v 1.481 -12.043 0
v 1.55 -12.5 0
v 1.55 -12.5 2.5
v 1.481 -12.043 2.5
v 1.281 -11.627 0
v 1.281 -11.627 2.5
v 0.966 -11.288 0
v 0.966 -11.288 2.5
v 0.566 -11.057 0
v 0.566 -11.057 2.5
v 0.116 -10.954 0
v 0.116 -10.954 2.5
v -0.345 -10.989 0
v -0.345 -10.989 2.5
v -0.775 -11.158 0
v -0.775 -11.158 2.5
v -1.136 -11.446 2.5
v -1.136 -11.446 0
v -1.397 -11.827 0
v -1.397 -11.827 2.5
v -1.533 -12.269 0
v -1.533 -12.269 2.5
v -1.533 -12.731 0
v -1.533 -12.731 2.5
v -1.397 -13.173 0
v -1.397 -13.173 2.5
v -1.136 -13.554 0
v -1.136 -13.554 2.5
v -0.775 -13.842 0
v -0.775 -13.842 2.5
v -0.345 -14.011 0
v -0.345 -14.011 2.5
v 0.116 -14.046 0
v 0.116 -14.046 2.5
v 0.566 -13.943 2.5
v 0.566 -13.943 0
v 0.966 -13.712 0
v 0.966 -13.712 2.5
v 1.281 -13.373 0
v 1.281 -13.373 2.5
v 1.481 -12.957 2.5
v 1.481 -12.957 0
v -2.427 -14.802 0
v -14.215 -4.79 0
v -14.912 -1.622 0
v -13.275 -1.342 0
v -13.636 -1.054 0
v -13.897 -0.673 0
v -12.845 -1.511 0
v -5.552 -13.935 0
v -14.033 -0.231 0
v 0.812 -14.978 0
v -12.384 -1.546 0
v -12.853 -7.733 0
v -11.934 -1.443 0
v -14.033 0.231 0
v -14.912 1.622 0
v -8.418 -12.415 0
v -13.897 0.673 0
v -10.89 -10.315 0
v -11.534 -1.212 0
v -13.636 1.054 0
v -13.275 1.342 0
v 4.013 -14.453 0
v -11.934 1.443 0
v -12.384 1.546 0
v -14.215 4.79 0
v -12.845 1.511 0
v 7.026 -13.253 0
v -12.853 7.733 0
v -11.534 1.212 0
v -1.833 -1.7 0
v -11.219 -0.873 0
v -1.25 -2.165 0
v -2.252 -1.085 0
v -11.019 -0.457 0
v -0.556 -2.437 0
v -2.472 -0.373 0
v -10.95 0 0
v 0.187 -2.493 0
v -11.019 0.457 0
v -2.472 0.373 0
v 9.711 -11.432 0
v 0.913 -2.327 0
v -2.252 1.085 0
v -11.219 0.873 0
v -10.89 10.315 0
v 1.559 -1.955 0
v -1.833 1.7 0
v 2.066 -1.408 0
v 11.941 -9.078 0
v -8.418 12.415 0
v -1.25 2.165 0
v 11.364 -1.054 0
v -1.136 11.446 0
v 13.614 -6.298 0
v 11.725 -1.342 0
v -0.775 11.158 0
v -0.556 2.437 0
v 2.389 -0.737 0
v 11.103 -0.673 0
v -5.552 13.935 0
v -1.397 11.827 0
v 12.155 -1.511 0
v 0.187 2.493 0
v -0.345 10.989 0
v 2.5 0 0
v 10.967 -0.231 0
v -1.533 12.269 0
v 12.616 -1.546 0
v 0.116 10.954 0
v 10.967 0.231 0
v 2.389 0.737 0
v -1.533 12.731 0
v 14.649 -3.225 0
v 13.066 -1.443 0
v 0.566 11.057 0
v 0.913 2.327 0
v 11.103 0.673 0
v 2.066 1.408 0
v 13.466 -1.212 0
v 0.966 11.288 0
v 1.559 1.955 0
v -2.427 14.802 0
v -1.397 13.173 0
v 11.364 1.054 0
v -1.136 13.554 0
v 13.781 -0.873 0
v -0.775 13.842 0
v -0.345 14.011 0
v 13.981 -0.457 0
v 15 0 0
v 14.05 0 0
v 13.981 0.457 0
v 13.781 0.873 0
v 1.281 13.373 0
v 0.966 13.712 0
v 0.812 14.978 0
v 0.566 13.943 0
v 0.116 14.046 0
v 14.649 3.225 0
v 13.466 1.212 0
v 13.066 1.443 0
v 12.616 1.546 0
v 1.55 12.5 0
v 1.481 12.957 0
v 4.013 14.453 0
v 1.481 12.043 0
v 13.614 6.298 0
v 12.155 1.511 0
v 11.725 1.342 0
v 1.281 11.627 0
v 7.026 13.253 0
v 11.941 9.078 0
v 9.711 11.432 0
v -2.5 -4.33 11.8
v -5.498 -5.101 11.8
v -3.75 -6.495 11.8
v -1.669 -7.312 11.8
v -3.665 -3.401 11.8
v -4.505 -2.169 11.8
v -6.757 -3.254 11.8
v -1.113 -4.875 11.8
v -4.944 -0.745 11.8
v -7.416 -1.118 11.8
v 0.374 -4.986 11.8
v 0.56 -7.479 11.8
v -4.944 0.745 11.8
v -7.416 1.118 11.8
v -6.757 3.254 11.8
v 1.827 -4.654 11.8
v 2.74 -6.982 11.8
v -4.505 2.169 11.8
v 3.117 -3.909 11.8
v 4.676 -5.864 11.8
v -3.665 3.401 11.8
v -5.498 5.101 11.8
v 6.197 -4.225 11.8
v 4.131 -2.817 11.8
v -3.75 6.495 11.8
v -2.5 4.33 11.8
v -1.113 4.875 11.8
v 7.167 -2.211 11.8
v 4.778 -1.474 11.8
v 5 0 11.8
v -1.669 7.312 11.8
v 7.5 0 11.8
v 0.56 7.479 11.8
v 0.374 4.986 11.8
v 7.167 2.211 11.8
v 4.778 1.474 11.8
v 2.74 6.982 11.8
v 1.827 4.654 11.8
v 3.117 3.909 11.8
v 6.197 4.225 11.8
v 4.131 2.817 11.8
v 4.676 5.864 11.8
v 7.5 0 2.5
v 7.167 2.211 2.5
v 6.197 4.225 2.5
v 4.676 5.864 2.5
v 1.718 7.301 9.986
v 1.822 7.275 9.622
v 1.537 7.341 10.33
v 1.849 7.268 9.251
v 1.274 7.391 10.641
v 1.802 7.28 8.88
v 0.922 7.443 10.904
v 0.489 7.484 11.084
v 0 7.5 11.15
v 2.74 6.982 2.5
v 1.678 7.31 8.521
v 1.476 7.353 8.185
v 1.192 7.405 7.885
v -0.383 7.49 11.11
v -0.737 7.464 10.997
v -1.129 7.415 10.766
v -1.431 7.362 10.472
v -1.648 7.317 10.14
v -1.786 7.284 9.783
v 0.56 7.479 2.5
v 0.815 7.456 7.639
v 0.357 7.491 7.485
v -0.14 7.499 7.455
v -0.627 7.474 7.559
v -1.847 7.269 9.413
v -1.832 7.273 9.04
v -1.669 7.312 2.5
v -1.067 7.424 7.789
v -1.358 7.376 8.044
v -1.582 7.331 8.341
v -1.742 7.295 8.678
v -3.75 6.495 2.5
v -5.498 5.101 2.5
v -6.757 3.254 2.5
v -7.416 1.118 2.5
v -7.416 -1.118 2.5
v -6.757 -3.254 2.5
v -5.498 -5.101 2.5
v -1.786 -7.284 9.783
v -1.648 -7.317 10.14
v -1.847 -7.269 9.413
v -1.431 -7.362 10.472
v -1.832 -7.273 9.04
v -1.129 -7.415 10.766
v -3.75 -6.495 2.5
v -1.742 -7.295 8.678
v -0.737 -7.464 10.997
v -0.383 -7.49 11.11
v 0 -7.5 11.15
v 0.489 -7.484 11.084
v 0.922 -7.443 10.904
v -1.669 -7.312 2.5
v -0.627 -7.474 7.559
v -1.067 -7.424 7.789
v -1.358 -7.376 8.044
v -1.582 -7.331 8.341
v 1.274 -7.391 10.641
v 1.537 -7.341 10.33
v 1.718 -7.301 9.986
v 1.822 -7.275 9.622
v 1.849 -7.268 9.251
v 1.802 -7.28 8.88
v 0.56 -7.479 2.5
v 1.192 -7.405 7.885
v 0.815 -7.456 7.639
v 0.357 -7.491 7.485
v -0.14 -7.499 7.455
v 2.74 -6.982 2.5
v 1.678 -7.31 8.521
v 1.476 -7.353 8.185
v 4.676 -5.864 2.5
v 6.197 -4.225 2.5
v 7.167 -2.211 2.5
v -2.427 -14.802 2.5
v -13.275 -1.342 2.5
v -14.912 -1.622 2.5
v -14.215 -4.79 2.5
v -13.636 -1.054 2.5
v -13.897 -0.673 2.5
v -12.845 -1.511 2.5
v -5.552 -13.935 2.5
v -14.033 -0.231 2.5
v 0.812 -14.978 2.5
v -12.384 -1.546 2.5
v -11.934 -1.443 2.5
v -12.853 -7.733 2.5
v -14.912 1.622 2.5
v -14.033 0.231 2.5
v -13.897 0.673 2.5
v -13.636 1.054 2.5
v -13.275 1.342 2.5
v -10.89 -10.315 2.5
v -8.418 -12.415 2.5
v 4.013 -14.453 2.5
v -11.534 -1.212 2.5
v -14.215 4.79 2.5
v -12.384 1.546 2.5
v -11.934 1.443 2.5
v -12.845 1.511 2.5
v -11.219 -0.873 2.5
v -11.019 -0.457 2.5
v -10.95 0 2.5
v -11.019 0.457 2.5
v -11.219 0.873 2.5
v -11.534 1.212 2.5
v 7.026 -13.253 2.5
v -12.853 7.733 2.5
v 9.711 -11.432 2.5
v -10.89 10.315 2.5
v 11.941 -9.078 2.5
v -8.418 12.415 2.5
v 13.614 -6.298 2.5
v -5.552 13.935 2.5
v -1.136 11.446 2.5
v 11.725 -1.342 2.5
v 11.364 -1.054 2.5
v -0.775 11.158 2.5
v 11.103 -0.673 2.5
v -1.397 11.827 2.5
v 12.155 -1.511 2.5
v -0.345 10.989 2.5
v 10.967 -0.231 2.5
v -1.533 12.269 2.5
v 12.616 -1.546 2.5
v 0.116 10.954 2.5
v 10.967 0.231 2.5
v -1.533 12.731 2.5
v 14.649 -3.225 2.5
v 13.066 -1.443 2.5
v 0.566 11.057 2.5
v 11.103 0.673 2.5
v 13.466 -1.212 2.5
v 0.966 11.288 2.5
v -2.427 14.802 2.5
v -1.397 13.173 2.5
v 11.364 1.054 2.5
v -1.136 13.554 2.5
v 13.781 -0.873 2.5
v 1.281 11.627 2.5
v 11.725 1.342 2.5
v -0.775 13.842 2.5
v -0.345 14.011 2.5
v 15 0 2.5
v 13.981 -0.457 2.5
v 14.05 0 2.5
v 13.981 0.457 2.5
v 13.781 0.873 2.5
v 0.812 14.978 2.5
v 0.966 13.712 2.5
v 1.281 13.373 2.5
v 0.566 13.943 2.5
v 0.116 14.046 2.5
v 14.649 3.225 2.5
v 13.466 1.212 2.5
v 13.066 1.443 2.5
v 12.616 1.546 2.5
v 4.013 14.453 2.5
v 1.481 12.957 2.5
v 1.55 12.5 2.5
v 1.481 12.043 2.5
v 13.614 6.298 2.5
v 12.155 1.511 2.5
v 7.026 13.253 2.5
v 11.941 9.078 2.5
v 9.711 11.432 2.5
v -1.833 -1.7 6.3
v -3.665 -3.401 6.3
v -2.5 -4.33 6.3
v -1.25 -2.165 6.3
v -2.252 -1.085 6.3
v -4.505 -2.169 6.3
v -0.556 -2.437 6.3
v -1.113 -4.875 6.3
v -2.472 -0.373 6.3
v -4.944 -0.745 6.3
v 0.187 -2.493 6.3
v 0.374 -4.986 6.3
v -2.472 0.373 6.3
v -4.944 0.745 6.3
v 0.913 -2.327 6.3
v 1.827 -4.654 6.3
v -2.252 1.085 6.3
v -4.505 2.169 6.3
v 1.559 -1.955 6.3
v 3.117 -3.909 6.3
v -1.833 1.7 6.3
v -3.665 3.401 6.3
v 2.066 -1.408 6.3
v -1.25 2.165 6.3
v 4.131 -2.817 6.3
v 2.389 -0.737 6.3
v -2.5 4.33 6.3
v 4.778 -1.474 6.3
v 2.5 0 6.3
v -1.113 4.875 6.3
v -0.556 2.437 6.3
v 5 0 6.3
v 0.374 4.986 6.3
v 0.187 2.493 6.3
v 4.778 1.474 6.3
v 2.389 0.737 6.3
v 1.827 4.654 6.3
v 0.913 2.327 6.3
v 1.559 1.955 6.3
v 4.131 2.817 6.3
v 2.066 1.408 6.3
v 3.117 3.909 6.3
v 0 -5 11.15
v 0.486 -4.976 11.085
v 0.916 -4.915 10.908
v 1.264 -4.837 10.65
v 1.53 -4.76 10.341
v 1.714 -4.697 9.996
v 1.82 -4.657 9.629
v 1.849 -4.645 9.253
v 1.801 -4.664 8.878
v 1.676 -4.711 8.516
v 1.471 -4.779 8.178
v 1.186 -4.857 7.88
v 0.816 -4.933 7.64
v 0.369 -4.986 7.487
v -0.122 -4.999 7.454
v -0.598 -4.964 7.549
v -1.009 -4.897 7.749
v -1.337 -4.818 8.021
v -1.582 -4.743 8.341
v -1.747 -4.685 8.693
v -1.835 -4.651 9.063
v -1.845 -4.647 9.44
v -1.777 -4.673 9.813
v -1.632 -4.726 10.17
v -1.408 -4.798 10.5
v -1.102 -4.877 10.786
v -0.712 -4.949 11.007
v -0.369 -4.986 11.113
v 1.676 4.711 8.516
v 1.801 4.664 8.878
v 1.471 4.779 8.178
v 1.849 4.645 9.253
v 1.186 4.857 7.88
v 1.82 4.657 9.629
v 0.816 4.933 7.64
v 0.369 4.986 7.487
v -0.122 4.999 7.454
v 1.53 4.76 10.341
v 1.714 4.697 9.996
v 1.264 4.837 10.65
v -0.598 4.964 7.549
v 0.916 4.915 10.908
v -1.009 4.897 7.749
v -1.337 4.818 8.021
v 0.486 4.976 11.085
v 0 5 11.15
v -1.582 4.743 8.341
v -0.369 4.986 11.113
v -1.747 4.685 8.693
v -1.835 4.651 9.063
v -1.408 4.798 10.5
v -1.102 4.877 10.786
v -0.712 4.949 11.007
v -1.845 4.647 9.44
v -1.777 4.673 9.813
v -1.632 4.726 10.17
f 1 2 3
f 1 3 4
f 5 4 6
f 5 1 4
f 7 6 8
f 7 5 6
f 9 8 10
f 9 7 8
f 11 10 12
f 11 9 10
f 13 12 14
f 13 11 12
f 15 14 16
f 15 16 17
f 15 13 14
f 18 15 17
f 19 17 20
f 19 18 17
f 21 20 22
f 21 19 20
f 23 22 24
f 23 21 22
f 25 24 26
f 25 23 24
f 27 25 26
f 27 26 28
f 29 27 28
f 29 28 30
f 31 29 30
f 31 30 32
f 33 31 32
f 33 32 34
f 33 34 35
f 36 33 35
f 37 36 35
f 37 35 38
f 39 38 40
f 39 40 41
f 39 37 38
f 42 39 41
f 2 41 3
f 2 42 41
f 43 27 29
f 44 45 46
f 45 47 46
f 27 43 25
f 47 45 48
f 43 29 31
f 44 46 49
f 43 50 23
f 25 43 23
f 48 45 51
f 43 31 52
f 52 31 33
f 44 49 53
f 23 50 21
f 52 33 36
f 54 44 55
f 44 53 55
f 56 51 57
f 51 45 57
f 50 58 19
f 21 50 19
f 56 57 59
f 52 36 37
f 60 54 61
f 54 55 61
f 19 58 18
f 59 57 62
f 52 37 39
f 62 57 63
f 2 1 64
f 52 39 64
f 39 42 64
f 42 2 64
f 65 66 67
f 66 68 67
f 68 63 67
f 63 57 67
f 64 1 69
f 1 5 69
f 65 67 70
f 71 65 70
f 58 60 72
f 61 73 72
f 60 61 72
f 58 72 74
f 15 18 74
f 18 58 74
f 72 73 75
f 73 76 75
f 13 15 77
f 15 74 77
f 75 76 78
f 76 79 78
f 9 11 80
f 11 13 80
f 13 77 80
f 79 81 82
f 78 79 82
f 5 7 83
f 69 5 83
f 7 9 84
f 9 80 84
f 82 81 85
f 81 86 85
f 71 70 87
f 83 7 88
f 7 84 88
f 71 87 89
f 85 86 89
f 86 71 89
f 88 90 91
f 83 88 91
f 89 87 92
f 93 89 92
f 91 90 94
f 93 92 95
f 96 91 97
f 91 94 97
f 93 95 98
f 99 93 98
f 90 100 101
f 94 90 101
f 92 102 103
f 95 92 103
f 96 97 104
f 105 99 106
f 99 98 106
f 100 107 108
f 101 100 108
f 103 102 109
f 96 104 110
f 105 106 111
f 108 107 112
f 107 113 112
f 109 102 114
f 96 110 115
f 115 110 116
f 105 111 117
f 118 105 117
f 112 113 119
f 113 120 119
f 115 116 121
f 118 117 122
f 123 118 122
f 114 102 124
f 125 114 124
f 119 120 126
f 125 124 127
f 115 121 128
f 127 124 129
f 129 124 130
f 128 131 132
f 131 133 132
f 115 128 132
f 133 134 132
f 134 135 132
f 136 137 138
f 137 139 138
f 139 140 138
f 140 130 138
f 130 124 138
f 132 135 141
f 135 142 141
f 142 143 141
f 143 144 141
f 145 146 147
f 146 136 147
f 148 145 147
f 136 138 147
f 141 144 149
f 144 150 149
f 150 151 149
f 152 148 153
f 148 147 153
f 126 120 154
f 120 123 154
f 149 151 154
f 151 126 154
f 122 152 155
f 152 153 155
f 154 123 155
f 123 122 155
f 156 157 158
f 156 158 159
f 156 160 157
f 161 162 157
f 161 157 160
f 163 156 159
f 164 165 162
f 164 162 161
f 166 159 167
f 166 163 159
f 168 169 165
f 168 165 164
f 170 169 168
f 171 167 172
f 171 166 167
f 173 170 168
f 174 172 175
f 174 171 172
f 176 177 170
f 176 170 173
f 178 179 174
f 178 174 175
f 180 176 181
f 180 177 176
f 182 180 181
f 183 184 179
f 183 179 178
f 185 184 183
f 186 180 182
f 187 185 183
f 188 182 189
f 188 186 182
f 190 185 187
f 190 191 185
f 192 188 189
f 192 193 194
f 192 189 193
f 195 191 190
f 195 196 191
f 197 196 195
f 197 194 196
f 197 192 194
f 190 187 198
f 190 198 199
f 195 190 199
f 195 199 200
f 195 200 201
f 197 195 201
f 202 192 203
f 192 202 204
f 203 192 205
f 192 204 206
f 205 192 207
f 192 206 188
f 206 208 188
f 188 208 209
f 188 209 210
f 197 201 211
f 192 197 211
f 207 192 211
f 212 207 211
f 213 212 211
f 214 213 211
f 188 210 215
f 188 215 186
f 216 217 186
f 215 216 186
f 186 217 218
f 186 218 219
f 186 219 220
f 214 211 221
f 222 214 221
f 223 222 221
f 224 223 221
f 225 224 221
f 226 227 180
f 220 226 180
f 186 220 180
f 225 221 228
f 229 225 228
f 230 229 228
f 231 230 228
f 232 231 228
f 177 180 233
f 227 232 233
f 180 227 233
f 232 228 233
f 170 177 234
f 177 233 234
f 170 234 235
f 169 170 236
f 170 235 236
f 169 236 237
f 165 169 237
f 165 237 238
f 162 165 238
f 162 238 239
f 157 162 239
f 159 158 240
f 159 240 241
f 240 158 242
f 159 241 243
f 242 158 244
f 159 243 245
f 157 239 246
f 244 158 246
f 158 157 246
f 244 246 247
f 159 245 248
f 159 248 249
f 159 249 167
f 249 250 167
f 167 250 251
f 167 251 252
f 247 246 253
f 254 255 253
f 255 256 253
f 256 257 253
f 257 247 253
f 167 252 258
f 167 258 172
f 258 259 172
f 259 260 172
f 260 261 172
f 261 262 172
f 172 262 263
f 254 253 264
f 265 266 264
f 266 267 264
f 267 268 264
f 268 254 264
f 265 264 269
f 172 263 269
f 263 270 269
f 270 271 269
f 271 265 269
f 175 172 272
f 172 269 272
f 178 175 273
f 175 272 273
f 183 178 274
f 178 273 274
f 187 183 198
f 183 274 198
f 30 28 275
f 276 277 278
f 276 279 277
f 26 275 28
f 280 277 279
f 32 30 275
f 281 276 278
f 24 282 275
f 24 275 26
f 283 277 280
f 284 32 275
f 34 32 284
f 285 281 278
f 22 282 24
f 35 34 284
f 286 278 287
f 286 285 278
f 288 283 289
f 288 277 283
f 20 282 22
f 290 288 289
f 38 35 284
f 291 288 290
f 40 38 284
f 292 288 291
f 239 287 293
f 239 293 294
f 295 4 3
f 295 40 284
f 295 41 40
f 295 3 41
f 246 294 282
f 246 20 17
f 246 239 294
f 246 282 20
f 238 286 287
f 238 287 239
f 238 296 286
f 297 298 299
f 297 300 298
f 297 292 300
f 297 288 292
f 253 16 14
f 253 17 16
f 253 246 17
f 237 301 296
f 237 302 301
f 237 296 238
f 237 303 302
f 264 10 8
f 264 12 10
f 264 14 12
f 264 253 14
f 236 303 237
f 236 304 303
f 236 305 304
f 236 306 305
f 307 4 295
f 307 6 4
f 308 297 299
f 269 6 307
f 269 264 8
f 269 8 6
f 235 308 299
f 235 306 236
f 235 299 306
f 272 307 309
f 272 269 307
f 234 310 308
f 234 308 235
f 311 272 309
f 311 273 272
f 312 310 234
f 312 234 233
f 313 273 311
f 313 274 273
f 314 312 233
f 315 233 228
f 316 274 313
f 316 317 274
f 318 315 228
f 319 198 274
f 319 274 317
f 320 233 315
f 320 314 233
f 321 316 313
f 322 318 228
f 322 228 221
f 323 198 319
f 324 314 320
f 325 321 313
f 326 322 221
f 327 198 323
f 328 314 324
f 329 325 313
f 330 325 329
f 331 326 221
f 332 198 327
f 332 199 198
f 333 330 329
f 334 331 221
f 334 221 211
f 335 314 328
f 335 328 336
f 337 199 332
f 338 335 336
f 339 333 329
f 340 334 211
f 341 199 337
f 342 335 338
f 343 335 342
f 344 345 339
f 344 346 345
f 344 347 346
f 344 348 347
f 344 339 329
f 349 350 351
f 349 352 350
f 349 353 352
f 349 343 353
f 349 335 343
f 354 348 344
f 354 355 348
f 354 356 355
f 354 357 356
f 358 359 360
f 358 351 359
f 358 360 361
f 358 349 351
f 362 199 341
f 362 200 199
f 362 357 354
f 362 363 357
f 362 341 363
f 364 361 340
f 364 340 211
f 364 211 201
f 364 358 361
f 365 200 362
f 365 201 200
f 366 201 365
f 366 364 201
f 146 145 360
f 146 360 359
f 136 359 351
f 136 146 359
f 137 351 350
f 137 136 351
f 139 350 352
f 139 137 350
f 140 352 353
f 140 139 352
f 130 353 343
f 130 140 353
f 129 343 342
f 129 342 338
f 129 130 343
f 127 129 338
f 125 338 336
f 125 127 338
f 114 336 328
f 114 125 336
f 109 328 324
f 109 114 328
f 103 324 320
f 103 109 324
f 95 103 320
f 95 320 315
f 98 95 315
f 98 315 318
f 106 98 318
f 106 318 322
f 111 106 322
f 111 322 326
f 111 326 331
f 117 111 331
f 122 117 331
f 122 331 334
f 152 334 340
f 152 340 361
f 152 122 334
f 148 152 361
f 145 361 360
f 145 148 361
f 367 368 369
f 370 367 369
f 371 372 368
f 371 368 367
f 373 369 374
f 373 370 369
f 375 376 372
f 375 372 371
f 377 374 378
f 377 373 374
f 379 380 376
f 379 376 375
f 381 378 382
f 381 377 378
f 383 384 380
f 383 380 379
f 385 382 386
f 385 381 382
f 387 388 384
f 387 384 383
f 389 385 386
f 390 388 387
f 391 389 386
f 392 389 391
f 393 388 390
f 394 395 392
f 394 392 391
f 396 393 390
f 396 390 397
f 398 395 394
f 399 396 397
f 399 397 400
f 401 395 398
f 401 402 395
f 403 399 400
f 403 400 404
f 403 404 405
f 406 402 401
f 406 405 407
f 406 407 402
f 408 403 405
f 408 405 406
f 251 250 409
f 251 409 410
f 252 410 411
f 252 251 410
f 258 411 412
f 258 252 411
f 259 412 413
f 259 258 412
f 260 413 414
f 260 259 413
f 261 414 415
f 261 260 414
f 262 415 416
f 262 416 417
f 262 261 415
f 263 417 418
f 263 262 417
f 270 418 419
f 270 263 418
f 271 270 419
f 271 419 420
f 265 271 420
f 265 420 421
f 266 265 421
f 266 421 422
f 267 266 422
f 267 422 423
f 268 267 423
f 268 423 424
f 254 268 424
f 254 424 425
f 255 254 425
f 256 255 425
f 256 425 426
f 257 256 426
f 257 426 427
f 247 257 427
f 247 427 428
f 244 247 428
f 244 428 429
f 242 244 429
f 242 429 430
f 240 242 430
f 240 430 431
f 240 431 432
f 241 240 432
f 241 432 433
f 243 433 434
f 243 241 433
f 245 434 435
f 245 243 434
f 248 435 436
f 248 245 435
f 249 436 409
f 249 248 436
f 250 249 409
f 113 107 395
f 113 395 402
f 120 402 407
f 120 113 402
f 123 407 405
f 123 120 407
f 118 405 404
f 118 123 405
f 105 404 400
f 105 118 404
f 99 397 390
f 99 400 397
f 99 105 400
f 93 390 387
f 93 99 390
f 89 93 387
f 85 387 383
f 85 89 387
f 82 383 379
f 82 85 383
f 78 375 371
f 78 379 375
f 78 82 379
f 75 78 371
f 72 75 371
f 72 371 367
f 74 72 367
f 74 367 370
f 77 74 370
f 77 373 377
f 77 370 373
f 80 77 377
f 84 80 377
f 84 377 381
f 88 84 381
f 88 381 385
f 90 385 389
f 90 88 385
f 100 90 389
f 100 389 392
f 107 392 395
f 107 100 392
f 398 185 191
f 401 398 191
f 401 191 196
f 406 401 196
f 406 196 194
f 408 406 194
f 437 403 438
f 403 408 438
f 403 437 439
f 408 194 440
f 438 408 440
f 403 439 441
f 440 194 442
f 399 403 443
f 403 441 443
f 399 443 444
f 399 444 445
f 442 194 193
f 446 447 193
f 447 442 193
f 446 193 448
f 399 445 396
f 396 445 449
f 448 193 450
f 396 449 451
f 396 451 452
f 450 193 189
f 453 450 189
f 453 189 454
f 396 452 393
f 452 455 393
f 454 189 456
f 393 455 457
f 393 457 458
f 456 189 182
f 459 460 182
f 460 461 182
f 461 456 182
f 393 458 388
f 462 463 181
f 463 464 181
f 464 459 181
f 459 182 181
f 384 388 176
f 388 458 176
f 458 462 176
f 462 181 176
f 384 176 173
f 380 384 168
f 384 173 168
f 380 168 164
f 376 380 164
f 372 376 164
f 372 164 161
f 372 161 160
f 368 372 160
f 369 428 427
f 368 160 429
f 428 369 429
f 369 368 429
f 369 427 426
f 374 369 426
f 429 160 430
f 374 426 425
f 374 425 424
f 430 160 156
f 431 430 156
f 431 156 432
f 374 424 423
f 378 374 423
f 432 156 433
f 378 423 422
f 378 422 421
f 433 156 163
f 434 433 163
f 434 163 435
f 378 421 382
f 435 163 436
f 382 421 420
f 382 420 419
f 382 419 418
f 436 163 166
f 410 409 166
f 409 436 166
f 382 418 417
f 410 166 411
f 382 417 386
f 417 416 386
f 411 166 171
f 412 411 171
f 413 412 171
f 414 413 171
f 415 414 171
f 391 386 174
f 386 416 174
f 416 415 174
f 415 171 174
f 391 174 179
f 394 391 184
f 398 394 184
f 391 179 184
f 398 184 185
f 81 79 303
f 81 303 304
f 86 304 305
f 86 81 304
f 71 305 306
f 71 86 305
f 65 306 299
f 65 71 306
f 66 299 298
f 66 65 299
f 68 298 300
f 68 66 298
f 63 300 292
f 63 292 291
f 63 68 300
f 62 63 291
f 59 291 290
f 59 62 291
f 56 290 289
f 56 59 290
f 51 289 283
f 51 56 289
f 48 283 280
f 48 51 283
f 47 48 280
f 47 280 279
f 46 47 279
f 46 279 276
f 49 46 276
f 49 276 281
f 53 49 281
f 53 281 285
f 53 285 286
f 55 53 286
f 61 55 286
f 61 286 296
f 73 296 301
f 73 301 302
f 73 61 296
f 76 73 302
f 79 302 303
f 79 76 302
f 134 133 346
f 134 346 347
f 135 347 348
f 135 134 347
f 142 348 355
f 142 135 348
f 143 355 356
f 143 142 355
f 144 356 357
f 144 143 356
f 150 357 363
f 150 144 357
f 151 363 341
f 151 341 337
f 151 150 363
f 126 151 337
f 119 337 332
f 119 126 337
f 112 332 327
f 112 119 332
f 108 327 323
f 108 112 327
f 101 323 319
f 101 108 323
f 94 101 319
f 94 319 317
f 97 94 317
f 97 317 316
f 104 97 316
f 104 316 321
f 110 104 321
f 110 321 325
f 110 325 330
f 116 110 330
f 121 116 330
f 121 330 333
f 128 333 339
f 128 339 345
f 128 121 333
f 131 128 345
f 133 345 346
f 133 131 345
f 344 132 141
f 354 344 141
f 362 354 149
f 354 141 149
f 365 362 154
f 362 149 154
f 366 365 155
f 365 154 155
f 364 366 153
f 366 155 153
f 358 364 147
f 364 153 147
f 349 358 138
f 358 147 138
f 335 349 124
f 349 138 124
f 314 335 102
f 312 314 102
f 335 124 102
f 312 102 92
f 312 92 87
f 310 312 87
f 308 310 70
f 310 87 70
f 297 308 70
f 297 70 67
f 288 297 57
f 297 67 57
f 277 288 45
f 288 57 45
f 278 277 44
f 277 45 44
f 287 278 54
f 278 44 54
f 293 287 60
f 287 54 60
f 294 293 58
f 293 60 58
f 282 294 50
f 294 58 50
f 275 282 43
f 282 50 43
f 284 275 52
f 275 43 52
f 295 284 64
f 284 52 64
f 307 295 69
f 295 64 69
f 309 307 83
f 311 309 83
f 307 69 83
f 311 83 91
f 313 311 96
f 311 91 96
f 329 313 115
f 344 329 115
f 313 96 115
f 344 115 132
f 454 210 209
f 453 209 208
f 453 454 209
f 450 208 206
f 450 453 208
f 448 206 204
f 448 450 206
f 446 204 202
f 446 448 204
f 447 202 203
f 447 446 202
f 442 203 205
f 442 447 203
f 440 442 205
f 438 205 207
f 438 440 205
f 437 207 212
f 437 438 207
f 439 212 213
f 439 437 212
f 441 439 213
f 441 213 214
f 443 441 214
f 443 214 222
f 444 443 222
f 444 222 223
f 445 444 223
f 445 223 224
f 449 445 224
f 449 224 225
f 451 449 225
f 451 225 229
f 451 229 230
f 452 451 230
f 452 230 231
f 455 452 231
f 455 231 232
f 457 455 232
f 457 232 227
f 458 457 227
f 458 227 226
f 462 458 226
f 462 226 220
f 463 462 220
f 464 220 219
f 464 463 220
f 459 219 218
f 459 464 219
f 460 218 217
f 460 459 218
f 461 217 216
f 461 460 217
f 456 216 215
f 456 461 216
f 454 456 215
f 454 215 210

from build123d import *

# Parameters (mm, degrees)
SKETCH1_R               = 15
SKETCH1_R_2             = 1.55
BOSS_EXTRUDE1_DEPTH     = 2.5
BOSS_EXTRUDE2_START     = 2.5
SKETCH3_R               = 7.5
BOSS_EXTRUDE2_DEPTH     = 9.3
CUT_EXTRUDE1_DEPTH      = 25.274266209
CUT_EXTRUDE1_DEPTH_BACK = 25.274266209
SKETCH4_R               = 2.5
SKETCH5_R               = 5
CUT_EXTRUDE2_DEPTH      = 5.5
CUT_EXTRUDE3_DEPTH      = 25.274266209
CUT_EXTRUDE3_DEPTH_BACK = 25.274266209
SKETCH6_R               = 1.85


with BuildPart() as part:
    # Sketch1 → Boss-Extrude1 (new body)
    with BuildSketch(Plane.XY):
        Circle(SKETCH1_R)
        with Locations((0, 12.5)):
            Circle(SKETCH1_R_2, mode=Mode.SUBTRACT)
        with Locations((12.5, 0)):
            Circle(SKETCH1_R_2, mode=Mode.SUBTRACT)
        with Locations((0, -12.5)):
            Circle(SKETCH1_R_2, mode=Mode.SUBTRACT)
        with Locations((-12.5, 0)):
            Circle(SKETCH1_R_2, mode=Mode.SUBTRACT)
    extrude(amount=BOSS_EXTRUDE1_DEPTH)

    # Sketch3 → Boss-Extrude2 (add)
    with BuildSketch(Plane.XY.offset(BOSS_EXTRUDE2_START)):
        Circle(SKETCH3_R)
    extrude(amount=BOSS_EXTRUDE2_DEPTH)

    # Sketch4 → Cut-Extrude1 (cut, two sides: drawn at the far end of the back side and taken through both)
    with BuildSketch(Plane.XY.offset(11.8).offset(-CUT_EXTRUDE1_DEPTH_BACK)):
        Circle(SKETCH4_R)
    extrude(amount=CUT_EXTRUDE1_DEPTH + CUT_EXTRUDE1_DEPTH_BACK, mode=Mode.SUBTRACT)

    # Sketch5 → Cut-Extrude2 (cut)
    with BuildSketch(Plane.XY.offset(11.8)):
        Circle(SKETCH5_R)
    extrude(amount=-CUT_EXTRUDE2_DEPTH, mode=Mode.SUBTRACT)

    # Sketch6 → Cut-Extrude3 (cut, two sides: drawn at the far end of the back side and taken through both)
    with BuildSketch(Plane(origin=(0, 0, 0), x_dir=(1, 0, 0), z_dir=(0, 1, 0)).offset(-CUT_EXTRUDE3_DEPTH_BACK)):
        with Locations(Location((0, -9.3, 0), (0, 0, 270))):
            Circle(SKETCH6_R)
    extrude(amount=CUT_EXTRUDE3_DEPTH + CUT_EXTRUDE3_DEPTH_BACK, mode=Mode.SUBTRACT)


solid = part.part
